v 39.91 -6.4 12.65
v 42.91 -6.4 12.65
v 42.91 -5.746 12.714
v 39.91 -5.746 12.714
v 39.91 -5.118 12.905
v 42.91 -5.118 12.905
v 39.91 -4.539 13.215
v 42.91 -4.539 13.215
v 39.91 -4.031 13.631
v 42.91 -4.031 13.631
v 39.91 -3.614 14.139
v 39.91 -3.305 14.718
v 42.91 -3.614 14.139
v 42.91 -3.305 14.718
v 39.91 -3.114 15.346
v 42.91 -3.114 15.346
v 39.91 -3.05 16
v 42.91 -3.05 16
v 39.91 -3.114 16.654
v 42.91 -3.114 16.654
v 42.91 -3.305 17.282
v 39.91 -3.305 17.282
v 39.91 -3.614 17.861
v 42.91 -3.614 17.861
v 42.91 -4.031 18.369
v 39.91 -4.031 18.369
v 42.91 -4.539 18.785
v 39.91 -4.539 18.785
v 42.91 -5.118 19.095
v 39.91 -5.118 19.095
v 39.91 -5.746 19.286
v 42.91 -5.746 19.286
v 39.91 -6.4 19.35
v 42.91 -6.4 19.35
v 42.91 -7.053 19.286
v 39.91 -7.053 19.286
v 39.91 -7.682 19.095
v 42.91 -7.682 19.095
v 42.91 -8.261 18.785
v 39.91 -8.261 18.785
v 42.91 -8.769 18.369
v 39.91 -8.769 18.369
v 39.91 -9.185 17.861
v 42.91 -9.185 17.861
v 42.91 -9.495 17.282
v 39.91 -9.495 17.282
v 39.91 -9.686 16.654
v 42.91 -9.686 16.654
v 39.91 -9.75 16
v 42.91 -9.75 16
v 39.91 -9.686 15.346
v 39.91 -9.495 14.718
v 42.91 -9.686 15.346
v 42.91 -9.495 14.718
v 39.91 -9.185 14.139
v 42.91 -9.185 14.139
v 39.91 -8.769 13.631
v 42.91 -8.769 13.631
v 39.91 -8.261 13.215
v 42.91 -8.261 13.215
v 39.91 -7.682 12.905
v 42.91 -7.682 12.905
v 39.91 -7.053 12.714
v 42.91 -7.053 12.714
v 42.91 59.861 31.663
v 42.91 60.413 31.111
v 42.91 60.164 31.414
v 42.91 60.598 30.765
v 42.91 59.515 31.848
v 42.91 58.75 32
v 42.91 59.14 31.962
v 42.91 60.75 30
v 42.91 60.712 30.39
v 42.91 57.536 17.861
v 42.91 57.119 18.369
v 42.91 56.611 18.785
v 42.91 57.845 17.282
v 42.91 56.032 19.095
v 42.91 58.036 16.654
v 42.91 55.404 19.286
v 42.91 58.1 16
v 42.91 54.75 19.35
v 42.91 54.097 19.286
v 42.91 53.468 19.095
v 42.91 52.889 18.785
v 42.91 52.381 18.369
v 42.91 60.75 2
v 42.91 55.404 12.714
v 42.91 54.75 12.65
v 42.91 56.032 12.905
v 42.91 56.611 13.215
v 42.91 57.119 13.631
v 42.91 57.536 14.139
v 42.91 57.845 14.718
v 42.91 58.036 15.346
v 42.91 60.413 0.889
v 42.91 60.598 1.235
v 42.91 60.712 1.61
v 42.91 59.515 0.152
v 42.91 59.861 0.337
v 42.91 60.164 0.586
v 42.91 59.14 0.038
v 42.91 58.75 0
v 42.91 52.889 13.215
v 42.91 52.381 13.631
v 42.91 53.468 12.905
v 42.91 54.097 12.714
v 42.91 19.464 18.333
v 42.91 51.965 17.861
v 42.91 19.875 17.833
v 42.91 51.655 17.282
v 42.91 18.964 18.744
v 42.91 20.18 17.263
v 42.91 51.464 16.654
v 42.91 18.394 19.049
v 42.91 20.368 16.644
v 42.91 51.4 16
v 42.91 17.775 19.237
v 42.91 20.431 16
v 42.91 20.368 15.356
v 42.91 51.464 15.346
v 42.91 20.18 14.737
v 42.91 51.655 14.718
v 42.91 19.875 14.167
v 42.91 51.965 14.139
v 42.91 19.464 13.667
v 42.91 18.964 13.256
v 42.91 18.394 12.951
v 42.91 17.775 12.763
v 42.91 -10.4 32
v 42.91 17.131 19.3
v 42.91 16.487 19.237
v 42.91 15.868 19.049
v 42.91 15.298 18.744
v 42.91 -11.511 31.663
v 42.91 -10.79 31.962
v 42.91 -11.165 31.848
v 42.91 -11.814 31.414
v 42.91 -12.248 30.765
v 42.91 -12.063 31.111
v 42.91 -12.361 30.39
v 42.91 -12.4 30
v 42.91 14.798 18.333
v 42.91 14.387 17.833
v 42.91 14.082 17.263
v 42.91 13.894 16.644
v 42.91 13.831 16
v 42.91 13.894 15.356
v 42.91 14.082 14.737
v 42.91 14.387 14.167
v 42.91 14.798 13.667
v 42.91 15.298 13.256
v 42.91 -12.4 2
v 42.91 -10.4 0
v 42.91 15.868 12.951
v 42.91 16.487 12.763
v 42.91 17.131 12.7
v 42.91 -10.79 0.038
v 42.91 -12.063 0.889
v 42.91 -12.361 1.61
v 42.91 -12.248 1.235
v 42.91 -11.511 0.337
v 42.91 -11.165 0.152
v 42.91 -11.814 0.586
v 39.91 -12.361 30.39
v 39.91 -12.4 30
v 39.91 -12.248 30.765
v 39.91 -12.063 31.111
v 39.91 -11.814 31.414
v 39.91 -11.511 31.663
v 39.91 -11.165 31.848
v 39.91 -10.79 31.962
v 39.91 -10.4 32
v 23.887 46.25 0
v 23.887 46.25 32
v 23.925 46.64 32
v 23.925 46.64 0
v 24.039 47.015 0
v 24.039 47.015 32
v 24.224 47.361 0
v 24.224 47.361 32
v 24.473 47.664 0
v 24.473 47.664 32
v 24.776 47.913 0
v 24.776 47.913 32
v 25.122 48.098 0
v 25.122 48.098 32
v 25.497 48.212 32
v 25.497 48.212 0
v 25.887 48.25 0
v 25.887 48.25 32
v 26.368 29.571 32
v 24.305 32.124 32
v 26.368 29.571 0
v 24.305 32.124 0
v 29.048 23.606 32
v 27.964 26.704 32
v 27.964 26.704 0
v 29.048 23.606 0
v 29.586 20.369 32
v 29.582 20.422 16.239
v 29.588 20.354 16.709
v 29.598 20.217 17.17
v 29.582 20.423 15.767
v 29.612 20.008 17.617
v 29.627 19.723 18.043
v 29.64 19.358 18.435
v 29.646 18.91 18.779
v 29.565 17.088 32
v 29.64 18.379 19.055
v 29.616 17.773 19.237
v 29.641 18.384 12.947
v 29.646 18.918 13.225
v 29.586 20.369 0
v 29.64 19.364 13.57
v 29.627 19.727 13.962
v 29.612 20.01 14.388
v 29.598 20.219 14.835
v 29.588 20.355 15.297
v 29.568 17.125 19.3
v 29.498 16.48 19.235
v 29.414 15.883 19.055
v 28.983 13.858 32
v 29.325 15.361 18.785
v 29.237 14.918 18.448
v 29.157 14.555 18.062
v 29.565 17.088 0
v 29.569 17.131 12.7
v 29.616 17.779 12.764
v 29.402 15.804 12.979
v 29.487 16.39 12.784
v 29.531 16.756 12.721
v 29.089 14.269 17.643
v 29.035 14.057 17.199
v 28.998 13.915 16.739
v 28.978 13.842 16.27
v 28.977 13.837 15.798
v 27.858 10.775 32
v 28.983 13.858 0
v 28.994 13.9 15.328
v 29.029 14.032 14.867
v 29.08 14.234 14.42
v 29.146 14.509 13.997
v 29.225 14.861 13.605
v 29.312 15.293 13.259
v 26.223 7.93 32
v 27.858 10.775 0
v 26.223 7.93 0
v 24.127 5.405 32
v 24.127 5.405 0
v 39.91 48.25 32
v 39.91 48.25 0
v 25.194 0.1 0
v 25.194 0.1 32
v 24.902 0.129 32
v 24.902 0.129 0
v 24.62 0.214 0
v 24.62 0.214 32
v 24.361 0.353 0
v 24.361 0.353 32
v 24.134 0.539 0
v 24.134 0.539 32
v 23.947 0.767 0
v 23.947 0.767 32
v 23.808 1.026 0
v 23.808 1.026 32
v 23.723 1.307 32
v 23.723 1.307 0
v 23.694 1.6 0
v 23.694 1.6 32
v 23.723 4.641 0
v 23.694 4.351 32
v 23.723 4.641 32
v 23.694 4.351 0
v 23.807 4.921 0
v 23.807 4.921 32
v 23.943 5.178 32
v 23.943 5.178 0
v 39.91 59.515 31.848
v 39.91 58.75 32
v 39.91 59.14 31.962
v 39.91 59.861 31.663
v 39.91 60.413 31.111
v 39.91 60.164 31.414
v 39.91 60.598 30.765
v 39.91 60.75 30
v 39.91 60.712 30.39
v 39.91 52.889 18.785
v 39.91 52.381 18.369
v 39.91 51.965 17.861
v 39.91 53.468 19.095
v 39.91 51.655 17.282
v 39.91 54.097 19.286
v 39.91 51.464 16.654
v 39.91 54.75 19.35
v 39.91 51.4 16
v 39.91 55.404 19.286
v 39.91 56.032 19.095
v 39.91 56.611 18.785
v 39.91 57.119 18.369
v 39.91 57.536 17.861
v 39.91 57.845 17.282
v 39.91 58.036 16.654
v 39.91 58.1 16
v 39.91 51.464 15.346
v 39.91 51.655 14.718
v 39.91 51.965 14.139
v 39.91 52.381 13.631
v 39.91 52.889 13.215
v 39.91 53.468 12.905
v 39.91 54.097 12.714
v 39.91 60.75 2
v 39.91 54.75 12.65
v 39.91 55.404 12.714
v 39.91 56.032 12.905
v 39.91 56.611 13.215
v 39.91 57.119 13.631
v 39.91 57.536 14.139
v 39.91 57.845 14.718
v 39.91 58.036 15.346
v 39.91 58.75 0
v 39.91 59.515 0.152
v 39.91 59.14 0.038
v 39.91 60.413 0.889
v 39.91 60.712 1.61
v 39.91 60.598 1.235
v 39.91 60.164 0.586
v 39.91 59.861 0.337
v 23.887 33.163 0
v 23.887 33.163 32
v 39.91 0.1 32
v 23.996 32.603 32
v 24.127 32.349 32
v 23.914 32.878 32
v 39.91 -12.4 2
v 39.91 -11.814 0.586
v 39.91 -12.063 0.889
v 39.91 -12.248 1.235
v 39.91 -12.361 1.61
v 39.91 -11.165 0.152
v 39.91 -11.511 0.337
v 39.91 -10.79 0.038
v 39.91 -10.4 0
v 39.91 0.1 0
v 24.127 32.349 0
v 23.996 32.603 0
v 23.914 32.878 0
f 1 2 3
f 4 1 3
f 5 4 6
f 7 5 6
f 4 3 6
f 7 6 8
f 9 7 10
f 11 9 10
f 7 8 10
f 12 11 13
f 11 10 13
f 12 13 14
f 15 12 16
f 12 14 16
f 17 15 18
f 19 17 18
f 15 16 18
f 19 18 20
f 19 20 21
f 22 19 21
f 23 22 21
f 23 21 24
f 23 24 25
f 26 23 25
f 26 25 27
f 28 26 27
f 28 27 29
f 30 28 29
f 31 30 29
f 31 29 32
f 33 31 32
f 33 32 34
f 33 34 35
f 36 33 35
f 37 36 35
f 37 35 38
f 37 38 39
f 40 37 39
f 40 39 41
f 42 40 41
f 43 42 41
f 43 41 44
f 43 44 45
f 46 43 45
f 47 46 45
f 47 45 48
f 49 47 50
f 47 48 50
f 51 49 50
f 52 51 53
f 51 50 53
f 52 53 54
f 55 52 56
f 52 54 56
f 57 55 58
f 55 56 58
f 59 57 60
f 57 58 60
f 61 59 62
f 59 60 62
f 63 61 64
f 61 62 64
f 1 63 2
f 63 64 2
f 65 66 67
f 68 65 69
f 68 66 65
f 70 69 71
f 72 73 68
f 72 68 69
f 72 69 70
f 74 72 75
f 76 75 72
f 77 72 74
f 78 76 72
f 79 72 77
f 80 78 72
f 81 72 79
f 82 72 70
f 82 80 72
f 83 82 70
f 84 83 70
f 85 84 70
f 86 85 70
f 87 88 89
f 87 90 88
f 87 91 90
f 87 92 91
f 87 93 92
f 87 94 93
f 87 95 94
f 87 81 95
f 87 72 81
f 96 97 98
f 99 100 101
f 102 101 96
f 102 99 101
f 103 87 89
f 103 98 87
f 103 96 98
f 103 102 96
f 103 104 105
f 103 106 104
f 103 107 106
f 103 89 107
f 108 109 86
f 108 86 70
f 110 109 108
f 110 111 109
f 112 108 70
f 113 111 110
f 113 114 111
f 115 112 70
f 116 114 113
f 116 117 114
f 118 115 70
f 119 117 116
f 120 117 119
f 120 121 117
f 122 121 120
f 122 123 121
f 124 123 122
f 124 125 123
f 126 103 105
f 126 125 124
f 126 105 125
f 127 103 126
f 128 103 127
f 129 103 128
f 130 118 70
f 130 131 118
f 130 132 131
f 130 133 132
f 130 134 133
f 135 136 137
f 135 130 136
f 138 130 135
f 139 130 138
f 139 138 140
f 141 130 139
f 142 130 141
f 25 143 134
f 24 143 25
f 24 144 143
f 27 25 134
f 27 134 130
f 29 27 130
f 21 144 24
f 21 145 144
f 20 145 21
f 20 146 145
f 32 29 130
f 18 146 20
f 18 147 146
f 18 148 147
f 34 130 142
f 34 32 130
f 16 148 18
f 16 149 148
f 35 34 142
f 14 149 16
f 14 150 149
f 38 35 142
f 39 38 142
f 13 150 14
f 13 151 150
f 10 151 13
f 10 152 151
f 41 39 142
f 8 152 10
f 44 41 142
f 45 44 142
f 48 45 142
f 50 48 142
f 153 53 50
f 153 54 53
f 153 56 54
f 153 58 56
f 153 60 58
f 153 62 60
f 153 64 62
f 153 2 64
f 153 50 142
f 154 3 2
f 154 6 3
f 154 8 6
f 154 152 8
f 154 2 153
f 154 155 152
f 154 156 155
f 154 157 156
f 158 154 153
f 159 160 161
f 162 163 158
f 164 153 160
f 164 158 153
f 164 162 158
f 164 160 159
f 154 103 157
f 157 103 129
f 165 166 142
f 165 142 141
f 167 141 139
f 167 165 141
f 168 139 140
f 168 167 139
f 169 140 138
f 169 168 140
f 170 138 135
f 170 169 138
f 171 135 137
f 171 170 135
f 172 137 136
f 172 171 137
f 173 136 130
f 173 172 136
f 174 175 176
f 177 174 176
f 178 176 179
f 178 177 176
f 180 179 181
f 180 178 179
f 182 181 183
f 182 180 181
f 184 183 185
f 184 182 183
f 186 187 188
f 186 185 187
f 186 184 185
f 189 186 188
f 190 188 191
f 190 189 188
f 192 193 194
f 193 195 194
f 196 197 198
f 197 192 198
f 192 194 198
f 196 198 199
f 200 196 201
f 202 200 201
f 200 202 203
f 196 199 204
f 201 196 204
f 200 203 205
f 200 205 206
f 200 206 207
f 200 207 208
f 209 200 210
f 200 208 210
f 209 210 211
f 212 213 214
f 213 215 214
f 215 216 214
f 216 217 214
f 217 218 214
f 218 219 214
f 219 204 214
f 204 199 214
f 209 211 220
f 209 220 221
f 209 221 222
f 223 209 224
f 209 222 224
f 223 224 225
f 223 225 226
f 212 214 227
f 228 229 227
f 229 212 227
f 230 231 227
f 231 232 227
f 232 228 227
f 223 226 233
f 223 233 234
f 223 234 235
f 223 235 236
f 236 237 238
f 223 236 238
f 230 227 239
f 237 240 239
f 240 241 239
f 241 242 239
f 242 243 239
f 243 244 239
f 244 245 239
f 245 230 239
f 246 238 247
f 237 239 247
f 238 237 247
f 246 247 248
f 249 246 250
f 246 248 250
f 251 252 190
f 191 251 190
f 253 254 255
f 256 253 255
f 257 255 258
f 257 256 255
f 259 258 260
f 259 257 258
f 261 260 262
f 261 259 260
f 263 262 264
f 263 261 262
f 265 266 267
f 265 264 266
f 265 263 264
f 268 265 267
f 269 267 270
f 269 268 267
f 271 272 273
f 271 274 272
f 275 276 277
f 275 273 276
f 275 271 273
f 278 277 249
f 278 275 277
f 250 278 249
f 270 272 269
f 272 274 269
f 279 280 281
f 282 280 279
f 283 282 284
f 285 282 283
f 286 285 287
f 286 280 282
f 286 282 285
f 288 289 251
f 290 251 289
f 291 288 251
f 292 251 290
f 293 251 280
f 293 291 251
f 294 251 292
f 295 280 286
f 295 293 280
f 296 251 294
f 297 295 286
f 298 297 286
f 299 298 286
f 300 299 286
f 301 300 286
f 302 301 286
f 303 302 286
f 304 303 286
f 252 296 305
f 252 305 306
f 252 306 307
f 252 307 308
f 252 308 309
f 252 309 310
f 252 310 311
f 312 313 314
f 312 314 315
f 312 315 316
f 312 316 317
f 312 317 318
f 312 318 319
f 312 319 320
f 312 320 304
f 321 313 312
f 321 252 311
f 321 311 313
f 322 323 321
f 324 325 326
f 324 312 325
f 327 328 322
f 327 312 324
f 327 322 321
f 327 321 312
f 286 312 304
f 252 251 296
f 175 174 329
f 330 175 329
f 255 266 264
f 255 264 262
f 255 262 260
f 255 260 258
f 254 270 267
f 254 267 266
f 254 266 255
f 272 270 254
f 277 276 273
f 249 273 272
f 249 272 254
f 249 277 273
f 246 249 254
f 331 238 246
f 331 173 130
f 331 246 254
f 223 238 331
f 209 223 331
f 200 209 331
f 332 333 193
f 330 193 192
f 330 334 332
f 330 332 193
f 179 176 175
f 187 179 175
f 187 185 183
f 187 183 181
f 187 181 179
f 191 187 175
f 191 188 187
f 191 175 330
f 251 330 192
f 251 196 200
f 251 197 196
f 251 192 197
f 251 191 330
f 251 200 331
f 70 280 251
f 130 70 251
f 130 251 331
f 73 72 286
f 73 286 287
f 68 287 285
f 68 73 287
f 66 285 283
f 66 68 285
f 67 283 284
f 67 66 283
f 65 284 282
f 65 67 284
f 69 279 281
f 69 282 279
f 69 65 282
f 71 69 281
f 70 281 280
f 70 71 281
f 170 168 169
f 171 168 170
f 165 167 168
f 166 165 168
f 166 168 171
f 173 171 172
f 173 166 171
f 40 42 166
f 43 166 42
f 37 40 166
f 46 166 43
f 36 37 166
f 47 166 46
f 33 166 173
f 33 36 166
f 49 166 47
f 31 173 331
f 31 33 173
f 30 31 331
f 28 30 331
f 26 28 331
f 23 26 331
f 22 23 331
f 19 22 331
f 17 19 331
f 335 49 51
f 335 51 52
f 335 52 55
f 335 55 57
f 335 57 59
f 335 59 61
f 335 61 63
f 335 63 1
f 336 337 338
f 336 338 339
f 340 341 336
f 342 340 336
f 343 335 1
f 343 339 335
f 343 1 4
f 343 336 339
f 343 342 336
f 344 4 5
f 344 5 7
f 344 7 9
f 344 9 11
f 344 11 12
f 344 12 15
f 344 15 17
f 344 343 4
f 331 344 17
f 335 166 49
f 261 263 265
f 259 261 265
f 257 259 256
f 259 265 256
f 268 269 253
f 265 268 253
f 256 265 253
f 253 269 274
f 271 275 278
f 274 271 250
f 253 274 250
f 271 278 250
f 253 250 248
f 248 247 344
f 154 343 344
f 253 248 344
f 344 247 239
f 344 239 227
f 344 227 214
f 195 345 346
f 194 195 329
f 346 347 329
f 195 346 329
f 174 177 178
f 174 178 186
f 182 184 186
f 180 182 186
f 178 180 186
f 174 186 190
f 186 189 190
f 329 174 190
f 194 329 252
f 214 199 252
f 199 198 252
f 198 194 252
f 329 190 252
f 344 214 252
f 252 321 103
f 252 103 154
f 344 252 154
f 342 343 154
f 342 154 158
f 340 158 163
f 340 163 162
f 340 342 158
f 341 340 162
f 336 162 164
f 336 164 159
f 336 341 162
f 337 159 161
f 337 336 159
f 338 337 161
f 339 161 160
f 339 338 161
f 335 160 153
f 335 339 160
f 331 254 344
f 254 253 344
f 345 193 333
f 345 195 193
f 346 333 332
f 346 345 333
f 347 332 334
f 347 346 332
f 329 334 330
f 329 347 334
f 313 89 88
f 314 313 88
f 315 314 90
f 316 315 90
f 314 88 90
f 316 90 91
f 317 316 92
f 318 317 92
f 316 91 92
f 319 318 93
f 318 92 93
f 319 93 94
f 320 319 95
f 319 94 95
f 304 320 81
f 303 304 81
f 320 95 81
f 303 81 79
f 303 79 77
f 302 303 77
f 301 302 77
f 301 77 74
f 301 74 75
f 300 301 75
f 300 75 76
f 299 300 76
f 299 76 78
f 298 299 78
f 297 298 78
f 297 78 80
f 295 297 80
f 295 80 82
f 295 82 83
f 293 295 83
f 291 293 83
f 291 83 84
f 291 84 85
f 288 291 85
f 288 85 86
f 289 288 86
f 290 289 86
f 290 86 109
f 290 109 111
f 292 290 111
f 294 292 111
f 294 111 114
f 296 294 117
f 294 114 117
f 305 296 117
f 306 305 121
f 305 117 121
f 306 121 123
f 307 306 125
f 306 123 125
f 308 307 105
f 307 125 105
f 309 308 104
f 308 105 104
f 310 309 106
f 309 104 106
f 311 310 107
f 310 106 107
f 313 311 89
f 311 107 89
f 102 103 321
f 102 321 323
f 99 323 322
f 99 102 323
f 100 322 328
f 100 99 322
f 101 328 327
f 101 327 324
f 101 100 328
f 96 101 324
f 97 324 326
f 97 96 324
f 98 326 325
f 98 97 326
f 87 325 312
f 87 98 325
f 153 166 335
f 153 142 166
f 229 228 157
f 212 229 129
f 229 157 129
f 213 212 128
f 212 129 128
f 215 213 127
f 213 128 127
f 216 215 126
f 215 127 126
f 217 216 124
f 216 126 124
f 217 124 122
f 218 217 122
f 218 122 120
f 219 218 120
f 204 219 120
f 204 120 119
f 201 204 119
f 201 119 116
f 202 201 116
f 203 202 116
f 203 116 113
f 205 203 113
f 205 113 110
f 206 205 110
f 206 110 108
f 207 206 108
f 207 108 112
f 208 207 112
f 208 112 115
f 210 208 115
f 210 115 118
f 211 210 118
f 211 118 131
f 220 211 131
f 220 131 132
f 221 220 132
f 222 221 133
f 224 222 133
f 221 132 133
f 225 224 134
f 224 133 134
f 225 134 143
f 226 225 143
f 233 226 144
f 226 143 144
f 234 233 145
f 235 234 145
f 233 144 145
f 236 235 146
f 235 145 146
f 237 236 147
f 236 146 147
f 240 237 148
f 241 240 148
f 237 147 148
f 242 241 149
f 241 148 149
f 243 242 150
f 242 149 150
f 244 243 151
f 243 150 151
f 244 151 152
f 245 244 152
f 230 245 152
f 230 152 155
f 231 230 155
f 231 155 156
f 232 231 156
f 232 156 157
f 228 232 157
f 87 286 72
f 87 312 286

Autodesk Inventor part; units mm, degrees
ref_plane "YZ Plane" through (0, 0, 0) normal (1, 0, 0) x (0, 1, 0)
ref_plane "XZ Plane" through (0, 0, 0) normal (0, 1, 0) x (-1, 0, 0)
sketch "Sketch1" plane through (0, 0, 0) normal (0, 0, 1) x (1, 0, 0)
  arc A0 (23.7707, 5.756) -> (23.9448, 31.7775) centre (10.4963, 18.8562) ccw
  line L0 (42.91, 38.9085) -> (39.91, 38.8609)
  line L1 (42.91, -0.4) -> (39.91, -0.4)
  line L2 (23.1942, 4.3512) -> (23.1942, 1.6)
  line L3 (39.91, 60.7501) -> (42.91, 60.7501)
  line L4 (42.91, 60.7501) -> (42.91, -23.2499)
  line L5 (42.91, -23.2499) -> (39.91, -23.2499)
  line L6 (39.91, -23.2499) -> (39.91, -0.4)
  line L7 (39.91, 38.8609) -> (39.91, 60.7501)
  line L8 (39.91, -23.2499) -> (39.91, -0.4)
  line L9 (39.91, -0.4) -> (39.91, 60.7501)
  arc A1 (23.1942, 1.6) -> (25.1942, -0.4) centre (25.1942, 1.6) ccw
  arc A2 (23.387, 33.1631) -> (23.9448, 31.7775) centre (25.387, 33.1631) ccw
  arc A3 (23.7707, 5.756) -> (23.1942, 4.3512) centre (25.1942, 4.3512) ccw
  line L10 (39.91, 38.8609) -> (25.3553, 38.63)
  line L11 (39.91, -0.4) -> (25.1942, -0.4)
  line L12 (40.0772, 38.3635) -> (25.3632, 38.13)
  line L13 (23.887, 36.6302) -> (23.887, 33.1631)
  arc A4 (23.887, 33.1631) -> (24.3054, 32.1239) centre (25.387, 33.1631) ccw
  arc A5 (24.1266, 5.4048) -> (24.3054, 32.1239) centre (10.4963, 18.8562) ccw
  arc A6 (24.1266, 5.4048) -> (23.6942, 4.3512) centre (25.1942, 4.3512) ccw
  line L14 (23.6942, 4.3512) -> (23.6942, 1.6)
  arc A7 (23.6942, 1.6) -> (25.1942, 0.1) centre (25.1942, 1.6) ccw
  line L15 (25.1942, 0.1) -> (39.91, 0.1)
  line L16 (39.91, 48.2501) -> (25.887, 48.2501)
  line L17 (23.887, 36.6302) -> (23.887, 46.2501)
  arc A8 (25.887, 48.2501) -> (23.887, 46.2501) centre (25.887, 46.2501) ccw
  point P0 (0, 0)
  point P1 (23.1942, 5.1965)
  point P2 (23.387, 32.334)
  point P3 (36.735, -12.4)
  point P4 (39.91, -12.3999)
  point P5 (39.91, 38.3609)
  dimension "d0" = 3
  dimension "d38" = 2
ref_plane "Work Plane1" through (39.91, -23.2499, 0) normal (-1, 0, 0) x (0, 0, 1)
extrude "Extrusion3" add sketch "Sketch1" along normal blind 32
sketch "Sketch4" plane through (42.91, -23.2499, 0) normal (1, 0, 0) x (0, 0, -1)
  circle A0 centre (-16, 78) radius 3.35
  circle A1 centre (-16, 16.85) radius 3.35
  line L0 (0, 0) -> (0, 84) projected
  line L1 (-32, 0) -> (-32, 84) projected
  line L2 (-32, 23.3499) -> (-32, 0) projected
  line L3 (-32, 10.85) -> (0, 10.85)
  line L4 (0, 23.3499) -> (0, 0) projected
  line L5 (0, 84) -> (-32, 84) projected
  line L6 (0, 0) -> (-32, 0) projected
  line L7 (-32, 0) -> (0, 0)
  line L8 (-16, 84) -> (-16, 10.85) construction
  circle A2 centre (-16, 40.3809) radius 3.3
  point P0 (0, 23.2499)
  dimension "d23" = 6.7
  dimension "d26" = 32
  dimension "d31" = 73.15
  dimension "d33" = 6
  dimension "d34" = 6
  dimension "d39" = 6.6
extrude "Extrusion4" cut sketch "Sketch4" against normal blind 32 contours A0 | A1 | L6 L1 L3 L0 | A2
fillet "Fillet3" radius 2 4 edges at (41.41, 60.7501, 32) (41.41, 60.7501, 0) (41.41, -12.3999, 0) (41.41, -12.3999, 32)
properties part number "Motor Cleat"
